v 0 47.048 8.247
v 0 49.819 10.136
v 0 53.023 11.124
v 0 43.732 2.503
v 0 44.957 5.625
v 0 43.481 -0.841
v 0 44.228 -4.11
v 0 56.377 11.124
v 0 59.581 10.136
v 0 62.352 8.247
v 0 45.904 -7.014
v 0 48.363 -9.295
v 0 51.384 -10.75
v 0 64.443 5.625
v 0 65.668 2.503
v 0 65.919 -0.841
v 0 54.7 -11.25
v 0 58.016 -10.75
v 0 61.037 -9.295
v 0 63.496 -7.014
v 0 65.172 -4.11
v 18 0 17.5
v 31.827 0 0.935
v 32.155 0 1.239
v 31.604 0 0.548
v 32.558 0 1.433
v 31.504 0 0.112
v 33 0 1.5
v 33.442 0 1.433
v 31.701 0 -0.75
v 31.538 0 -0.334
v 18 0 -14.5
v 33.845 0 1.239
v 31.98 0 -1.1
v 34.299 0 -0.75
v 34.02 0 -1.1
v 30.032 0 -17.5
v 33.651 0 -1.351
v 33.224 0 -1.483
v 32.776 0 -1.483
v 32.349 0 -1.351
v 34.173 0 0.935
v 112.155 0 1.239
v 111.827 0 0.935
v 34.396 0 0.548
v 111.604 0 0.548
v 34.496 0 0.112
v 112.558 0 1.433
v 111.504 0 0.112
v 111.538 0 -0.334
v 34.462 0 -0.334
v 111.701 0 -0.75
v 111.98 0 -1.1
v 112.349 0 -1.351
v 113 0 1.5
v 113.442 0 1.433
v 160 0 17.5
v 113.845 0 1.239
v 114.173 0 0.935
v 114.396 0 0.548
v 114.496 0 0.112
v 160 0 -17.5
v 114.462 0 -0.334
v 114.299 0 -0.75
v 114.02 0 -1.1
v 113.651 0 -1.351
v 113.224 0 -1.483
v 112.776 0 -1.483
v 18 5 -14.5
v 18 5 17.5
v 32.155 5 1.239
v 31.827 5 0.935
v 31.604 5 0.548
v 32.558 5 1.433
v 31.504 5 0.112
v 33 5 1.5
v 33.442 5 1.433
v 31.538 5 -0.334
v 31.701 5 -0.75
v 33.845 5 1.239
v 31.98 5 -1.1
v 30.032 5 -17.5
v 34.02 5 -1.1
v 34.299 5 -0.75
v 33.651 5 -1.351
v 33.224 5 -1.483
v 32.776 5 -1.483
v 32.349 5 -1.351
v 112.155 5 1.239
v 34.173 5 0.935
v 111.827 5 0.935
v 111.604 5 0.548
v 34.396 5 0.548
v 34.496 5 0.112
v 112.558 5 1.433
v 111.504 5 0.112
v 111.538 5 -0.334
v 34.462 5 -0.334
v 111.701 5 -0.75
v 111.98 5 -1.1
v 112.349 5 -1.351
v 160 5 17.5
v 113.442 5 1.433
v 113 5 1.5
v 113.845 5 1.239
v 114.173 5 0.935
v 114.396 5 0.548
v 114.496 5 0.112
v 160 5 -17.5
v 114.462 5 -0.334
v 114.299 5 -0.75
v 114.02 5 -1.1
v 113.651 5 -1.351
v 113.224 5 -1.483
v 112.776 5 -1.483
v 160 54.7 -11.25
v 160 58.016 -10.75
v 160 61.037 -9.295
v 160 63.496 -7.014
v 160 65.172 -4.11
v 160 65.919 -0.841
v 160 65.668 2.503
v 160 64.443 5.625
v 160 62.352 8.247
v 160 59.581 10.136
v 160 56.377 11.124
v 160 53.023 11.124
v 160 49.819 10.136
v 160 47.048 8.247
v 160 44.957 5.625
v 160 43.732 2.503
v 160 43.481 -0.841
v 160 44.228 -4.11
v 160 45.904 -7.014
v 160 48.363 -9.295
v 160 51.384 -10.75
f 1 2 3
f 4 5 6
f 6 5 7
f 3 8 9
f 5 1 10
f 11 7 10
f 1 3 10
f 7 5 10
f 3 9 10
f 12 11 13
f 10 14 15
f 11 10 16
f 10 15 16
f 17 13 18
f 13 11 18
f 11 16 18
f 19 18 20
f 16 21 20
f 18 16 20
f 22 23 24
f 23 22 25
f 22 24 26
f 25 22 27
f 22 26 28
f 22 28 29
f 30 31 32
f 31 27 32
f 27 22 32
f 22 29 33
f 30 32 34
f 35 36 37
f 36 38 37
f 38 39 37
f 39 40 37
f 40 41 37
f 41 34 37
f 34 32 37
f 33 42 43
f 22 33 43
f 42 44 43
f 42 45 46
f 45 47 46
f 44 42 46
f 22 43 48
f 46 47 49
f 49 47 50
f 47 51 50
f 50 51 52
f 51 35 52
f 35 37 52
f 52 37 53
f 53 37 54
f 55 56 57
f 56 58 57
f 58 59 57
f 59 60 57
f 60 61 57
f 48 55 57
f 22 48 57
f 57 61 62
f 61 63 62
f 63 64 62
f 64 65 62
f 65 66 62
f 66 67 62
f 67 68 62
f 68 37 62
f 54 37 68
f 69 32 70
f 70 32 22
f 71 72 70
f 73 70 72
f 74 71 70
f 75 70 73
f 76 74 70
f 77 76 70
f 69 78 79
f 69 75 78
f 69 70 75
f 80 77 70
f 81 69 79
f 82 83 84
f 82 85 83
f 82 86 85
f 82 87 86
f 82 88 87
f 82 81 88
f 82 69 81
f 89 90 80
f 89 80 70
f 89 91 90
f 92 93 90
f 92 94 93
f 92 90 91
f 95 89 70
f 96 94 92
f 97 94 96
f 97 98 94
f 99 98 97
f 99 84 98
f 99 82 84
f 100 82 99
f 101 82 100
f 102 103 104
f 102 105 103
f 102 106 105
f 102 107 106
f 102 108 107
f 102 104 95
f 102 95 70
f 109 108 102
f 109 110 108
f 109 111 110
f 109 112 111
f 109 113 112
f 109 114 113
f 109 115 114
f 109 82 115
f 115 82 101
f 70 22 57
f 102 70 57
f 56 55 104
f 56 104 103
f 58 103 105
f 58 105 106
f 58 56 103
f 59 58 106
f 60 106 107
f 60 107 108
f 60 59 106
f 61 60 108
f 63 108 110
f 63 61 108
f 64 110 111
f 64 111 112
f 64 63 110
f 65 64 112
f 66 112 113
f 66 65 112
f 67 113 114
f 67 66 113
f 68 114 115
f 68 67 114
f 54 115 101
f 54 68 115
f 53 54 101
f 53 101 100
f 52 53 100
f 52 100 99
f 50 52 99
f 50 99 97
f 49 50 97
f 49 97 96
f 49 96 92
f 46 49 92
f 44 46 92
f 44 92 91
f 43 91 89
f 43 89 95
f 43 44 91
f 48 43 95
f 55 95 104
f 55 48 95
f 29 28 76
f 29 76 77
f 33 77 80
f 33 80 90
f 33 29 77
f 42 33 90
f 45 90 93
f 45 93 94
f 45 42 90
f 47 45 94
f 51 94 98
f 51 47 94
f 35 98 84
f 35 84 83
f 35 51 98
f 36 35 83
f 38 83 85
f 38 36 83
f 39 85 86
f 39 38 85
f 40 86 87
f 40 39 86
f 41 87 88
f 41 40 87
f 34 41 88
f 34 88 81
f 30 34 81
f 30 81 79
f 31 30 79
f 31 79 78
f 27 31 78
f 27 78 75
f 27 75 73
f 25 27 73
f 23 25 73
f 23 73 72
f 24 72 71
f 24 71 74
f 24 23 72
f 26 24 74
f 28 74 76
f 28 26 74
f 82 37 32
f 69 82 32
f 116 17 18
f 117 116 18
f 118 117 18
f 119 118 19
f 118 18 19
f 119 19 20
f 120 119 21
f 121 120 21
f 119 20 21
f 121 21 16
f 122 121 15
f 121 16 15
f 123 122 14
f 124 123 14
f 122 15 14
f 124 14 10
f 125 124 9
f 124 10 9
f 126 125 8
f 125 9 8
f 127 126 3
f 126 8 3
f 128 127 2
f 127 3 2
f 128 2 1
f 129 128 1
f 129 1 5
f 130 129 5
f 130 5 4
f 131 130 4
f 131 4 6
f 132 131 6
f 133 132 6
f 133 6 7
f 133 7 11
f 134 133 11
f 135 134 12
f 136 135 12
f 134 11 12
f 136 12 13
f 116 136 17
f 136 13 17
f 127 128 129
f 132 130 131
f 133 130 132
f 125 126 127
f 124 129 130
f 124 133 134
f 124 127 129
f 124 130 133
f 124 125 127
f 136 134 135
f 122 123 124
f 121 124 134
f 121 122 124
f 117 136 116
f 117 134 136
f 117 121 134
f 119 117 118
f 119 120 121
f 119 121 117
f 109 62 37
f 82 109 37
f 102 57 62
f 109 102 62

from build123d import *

# Parameters (mm, degrees)
SKETCH1_R           = 11.25
BOSS_EXTRUDE1_DEPTH = 160
SKETCH3_R           = 1.5
BOSS_EXTRUDE2_DEPTH = 5


with BuildPart() as part:
    # Sketch1 → Boss-Extrude1 (new body)
    with BuildSketch(Plane(origin=(0, 0, 0), x_dir=(0, 0, -1), z_dir=(1, 0, 0))):
        with Locations((0, 54.7)):
            Circle(SKETCH1_R)
    extrude(amount=BOSS_EXTRUDE1_DEPTH)


with BuildPart() as body_2:
    # Sketch3 → Boss-Extrude2 (new body)
    with BuildSketch(Plane(origin=(0, 0, 0), x_dir=(1, 0, 0), z_dir=(0, 1, 0))):
        Polygon((160, 17.5), (30.032342801, 17.5), (18, 14.5), (18, -17.5), (160, -17.5), align=None)
        with Locations(Location((33, 0, 0), (0, 0, 270))):
            Circle(SKETCH3_R, mode=Mode.SUBTRACT)
        with Locations(Location((113, 0, 0), (0, 0, 270))):
            Circle(SKETCH3_R, mode=Mode.SUBTRACT)
    extrude(amount=BOSS_EXTRUDE2_DEPTH)


solid = Compound([part.part, body_2.part])
